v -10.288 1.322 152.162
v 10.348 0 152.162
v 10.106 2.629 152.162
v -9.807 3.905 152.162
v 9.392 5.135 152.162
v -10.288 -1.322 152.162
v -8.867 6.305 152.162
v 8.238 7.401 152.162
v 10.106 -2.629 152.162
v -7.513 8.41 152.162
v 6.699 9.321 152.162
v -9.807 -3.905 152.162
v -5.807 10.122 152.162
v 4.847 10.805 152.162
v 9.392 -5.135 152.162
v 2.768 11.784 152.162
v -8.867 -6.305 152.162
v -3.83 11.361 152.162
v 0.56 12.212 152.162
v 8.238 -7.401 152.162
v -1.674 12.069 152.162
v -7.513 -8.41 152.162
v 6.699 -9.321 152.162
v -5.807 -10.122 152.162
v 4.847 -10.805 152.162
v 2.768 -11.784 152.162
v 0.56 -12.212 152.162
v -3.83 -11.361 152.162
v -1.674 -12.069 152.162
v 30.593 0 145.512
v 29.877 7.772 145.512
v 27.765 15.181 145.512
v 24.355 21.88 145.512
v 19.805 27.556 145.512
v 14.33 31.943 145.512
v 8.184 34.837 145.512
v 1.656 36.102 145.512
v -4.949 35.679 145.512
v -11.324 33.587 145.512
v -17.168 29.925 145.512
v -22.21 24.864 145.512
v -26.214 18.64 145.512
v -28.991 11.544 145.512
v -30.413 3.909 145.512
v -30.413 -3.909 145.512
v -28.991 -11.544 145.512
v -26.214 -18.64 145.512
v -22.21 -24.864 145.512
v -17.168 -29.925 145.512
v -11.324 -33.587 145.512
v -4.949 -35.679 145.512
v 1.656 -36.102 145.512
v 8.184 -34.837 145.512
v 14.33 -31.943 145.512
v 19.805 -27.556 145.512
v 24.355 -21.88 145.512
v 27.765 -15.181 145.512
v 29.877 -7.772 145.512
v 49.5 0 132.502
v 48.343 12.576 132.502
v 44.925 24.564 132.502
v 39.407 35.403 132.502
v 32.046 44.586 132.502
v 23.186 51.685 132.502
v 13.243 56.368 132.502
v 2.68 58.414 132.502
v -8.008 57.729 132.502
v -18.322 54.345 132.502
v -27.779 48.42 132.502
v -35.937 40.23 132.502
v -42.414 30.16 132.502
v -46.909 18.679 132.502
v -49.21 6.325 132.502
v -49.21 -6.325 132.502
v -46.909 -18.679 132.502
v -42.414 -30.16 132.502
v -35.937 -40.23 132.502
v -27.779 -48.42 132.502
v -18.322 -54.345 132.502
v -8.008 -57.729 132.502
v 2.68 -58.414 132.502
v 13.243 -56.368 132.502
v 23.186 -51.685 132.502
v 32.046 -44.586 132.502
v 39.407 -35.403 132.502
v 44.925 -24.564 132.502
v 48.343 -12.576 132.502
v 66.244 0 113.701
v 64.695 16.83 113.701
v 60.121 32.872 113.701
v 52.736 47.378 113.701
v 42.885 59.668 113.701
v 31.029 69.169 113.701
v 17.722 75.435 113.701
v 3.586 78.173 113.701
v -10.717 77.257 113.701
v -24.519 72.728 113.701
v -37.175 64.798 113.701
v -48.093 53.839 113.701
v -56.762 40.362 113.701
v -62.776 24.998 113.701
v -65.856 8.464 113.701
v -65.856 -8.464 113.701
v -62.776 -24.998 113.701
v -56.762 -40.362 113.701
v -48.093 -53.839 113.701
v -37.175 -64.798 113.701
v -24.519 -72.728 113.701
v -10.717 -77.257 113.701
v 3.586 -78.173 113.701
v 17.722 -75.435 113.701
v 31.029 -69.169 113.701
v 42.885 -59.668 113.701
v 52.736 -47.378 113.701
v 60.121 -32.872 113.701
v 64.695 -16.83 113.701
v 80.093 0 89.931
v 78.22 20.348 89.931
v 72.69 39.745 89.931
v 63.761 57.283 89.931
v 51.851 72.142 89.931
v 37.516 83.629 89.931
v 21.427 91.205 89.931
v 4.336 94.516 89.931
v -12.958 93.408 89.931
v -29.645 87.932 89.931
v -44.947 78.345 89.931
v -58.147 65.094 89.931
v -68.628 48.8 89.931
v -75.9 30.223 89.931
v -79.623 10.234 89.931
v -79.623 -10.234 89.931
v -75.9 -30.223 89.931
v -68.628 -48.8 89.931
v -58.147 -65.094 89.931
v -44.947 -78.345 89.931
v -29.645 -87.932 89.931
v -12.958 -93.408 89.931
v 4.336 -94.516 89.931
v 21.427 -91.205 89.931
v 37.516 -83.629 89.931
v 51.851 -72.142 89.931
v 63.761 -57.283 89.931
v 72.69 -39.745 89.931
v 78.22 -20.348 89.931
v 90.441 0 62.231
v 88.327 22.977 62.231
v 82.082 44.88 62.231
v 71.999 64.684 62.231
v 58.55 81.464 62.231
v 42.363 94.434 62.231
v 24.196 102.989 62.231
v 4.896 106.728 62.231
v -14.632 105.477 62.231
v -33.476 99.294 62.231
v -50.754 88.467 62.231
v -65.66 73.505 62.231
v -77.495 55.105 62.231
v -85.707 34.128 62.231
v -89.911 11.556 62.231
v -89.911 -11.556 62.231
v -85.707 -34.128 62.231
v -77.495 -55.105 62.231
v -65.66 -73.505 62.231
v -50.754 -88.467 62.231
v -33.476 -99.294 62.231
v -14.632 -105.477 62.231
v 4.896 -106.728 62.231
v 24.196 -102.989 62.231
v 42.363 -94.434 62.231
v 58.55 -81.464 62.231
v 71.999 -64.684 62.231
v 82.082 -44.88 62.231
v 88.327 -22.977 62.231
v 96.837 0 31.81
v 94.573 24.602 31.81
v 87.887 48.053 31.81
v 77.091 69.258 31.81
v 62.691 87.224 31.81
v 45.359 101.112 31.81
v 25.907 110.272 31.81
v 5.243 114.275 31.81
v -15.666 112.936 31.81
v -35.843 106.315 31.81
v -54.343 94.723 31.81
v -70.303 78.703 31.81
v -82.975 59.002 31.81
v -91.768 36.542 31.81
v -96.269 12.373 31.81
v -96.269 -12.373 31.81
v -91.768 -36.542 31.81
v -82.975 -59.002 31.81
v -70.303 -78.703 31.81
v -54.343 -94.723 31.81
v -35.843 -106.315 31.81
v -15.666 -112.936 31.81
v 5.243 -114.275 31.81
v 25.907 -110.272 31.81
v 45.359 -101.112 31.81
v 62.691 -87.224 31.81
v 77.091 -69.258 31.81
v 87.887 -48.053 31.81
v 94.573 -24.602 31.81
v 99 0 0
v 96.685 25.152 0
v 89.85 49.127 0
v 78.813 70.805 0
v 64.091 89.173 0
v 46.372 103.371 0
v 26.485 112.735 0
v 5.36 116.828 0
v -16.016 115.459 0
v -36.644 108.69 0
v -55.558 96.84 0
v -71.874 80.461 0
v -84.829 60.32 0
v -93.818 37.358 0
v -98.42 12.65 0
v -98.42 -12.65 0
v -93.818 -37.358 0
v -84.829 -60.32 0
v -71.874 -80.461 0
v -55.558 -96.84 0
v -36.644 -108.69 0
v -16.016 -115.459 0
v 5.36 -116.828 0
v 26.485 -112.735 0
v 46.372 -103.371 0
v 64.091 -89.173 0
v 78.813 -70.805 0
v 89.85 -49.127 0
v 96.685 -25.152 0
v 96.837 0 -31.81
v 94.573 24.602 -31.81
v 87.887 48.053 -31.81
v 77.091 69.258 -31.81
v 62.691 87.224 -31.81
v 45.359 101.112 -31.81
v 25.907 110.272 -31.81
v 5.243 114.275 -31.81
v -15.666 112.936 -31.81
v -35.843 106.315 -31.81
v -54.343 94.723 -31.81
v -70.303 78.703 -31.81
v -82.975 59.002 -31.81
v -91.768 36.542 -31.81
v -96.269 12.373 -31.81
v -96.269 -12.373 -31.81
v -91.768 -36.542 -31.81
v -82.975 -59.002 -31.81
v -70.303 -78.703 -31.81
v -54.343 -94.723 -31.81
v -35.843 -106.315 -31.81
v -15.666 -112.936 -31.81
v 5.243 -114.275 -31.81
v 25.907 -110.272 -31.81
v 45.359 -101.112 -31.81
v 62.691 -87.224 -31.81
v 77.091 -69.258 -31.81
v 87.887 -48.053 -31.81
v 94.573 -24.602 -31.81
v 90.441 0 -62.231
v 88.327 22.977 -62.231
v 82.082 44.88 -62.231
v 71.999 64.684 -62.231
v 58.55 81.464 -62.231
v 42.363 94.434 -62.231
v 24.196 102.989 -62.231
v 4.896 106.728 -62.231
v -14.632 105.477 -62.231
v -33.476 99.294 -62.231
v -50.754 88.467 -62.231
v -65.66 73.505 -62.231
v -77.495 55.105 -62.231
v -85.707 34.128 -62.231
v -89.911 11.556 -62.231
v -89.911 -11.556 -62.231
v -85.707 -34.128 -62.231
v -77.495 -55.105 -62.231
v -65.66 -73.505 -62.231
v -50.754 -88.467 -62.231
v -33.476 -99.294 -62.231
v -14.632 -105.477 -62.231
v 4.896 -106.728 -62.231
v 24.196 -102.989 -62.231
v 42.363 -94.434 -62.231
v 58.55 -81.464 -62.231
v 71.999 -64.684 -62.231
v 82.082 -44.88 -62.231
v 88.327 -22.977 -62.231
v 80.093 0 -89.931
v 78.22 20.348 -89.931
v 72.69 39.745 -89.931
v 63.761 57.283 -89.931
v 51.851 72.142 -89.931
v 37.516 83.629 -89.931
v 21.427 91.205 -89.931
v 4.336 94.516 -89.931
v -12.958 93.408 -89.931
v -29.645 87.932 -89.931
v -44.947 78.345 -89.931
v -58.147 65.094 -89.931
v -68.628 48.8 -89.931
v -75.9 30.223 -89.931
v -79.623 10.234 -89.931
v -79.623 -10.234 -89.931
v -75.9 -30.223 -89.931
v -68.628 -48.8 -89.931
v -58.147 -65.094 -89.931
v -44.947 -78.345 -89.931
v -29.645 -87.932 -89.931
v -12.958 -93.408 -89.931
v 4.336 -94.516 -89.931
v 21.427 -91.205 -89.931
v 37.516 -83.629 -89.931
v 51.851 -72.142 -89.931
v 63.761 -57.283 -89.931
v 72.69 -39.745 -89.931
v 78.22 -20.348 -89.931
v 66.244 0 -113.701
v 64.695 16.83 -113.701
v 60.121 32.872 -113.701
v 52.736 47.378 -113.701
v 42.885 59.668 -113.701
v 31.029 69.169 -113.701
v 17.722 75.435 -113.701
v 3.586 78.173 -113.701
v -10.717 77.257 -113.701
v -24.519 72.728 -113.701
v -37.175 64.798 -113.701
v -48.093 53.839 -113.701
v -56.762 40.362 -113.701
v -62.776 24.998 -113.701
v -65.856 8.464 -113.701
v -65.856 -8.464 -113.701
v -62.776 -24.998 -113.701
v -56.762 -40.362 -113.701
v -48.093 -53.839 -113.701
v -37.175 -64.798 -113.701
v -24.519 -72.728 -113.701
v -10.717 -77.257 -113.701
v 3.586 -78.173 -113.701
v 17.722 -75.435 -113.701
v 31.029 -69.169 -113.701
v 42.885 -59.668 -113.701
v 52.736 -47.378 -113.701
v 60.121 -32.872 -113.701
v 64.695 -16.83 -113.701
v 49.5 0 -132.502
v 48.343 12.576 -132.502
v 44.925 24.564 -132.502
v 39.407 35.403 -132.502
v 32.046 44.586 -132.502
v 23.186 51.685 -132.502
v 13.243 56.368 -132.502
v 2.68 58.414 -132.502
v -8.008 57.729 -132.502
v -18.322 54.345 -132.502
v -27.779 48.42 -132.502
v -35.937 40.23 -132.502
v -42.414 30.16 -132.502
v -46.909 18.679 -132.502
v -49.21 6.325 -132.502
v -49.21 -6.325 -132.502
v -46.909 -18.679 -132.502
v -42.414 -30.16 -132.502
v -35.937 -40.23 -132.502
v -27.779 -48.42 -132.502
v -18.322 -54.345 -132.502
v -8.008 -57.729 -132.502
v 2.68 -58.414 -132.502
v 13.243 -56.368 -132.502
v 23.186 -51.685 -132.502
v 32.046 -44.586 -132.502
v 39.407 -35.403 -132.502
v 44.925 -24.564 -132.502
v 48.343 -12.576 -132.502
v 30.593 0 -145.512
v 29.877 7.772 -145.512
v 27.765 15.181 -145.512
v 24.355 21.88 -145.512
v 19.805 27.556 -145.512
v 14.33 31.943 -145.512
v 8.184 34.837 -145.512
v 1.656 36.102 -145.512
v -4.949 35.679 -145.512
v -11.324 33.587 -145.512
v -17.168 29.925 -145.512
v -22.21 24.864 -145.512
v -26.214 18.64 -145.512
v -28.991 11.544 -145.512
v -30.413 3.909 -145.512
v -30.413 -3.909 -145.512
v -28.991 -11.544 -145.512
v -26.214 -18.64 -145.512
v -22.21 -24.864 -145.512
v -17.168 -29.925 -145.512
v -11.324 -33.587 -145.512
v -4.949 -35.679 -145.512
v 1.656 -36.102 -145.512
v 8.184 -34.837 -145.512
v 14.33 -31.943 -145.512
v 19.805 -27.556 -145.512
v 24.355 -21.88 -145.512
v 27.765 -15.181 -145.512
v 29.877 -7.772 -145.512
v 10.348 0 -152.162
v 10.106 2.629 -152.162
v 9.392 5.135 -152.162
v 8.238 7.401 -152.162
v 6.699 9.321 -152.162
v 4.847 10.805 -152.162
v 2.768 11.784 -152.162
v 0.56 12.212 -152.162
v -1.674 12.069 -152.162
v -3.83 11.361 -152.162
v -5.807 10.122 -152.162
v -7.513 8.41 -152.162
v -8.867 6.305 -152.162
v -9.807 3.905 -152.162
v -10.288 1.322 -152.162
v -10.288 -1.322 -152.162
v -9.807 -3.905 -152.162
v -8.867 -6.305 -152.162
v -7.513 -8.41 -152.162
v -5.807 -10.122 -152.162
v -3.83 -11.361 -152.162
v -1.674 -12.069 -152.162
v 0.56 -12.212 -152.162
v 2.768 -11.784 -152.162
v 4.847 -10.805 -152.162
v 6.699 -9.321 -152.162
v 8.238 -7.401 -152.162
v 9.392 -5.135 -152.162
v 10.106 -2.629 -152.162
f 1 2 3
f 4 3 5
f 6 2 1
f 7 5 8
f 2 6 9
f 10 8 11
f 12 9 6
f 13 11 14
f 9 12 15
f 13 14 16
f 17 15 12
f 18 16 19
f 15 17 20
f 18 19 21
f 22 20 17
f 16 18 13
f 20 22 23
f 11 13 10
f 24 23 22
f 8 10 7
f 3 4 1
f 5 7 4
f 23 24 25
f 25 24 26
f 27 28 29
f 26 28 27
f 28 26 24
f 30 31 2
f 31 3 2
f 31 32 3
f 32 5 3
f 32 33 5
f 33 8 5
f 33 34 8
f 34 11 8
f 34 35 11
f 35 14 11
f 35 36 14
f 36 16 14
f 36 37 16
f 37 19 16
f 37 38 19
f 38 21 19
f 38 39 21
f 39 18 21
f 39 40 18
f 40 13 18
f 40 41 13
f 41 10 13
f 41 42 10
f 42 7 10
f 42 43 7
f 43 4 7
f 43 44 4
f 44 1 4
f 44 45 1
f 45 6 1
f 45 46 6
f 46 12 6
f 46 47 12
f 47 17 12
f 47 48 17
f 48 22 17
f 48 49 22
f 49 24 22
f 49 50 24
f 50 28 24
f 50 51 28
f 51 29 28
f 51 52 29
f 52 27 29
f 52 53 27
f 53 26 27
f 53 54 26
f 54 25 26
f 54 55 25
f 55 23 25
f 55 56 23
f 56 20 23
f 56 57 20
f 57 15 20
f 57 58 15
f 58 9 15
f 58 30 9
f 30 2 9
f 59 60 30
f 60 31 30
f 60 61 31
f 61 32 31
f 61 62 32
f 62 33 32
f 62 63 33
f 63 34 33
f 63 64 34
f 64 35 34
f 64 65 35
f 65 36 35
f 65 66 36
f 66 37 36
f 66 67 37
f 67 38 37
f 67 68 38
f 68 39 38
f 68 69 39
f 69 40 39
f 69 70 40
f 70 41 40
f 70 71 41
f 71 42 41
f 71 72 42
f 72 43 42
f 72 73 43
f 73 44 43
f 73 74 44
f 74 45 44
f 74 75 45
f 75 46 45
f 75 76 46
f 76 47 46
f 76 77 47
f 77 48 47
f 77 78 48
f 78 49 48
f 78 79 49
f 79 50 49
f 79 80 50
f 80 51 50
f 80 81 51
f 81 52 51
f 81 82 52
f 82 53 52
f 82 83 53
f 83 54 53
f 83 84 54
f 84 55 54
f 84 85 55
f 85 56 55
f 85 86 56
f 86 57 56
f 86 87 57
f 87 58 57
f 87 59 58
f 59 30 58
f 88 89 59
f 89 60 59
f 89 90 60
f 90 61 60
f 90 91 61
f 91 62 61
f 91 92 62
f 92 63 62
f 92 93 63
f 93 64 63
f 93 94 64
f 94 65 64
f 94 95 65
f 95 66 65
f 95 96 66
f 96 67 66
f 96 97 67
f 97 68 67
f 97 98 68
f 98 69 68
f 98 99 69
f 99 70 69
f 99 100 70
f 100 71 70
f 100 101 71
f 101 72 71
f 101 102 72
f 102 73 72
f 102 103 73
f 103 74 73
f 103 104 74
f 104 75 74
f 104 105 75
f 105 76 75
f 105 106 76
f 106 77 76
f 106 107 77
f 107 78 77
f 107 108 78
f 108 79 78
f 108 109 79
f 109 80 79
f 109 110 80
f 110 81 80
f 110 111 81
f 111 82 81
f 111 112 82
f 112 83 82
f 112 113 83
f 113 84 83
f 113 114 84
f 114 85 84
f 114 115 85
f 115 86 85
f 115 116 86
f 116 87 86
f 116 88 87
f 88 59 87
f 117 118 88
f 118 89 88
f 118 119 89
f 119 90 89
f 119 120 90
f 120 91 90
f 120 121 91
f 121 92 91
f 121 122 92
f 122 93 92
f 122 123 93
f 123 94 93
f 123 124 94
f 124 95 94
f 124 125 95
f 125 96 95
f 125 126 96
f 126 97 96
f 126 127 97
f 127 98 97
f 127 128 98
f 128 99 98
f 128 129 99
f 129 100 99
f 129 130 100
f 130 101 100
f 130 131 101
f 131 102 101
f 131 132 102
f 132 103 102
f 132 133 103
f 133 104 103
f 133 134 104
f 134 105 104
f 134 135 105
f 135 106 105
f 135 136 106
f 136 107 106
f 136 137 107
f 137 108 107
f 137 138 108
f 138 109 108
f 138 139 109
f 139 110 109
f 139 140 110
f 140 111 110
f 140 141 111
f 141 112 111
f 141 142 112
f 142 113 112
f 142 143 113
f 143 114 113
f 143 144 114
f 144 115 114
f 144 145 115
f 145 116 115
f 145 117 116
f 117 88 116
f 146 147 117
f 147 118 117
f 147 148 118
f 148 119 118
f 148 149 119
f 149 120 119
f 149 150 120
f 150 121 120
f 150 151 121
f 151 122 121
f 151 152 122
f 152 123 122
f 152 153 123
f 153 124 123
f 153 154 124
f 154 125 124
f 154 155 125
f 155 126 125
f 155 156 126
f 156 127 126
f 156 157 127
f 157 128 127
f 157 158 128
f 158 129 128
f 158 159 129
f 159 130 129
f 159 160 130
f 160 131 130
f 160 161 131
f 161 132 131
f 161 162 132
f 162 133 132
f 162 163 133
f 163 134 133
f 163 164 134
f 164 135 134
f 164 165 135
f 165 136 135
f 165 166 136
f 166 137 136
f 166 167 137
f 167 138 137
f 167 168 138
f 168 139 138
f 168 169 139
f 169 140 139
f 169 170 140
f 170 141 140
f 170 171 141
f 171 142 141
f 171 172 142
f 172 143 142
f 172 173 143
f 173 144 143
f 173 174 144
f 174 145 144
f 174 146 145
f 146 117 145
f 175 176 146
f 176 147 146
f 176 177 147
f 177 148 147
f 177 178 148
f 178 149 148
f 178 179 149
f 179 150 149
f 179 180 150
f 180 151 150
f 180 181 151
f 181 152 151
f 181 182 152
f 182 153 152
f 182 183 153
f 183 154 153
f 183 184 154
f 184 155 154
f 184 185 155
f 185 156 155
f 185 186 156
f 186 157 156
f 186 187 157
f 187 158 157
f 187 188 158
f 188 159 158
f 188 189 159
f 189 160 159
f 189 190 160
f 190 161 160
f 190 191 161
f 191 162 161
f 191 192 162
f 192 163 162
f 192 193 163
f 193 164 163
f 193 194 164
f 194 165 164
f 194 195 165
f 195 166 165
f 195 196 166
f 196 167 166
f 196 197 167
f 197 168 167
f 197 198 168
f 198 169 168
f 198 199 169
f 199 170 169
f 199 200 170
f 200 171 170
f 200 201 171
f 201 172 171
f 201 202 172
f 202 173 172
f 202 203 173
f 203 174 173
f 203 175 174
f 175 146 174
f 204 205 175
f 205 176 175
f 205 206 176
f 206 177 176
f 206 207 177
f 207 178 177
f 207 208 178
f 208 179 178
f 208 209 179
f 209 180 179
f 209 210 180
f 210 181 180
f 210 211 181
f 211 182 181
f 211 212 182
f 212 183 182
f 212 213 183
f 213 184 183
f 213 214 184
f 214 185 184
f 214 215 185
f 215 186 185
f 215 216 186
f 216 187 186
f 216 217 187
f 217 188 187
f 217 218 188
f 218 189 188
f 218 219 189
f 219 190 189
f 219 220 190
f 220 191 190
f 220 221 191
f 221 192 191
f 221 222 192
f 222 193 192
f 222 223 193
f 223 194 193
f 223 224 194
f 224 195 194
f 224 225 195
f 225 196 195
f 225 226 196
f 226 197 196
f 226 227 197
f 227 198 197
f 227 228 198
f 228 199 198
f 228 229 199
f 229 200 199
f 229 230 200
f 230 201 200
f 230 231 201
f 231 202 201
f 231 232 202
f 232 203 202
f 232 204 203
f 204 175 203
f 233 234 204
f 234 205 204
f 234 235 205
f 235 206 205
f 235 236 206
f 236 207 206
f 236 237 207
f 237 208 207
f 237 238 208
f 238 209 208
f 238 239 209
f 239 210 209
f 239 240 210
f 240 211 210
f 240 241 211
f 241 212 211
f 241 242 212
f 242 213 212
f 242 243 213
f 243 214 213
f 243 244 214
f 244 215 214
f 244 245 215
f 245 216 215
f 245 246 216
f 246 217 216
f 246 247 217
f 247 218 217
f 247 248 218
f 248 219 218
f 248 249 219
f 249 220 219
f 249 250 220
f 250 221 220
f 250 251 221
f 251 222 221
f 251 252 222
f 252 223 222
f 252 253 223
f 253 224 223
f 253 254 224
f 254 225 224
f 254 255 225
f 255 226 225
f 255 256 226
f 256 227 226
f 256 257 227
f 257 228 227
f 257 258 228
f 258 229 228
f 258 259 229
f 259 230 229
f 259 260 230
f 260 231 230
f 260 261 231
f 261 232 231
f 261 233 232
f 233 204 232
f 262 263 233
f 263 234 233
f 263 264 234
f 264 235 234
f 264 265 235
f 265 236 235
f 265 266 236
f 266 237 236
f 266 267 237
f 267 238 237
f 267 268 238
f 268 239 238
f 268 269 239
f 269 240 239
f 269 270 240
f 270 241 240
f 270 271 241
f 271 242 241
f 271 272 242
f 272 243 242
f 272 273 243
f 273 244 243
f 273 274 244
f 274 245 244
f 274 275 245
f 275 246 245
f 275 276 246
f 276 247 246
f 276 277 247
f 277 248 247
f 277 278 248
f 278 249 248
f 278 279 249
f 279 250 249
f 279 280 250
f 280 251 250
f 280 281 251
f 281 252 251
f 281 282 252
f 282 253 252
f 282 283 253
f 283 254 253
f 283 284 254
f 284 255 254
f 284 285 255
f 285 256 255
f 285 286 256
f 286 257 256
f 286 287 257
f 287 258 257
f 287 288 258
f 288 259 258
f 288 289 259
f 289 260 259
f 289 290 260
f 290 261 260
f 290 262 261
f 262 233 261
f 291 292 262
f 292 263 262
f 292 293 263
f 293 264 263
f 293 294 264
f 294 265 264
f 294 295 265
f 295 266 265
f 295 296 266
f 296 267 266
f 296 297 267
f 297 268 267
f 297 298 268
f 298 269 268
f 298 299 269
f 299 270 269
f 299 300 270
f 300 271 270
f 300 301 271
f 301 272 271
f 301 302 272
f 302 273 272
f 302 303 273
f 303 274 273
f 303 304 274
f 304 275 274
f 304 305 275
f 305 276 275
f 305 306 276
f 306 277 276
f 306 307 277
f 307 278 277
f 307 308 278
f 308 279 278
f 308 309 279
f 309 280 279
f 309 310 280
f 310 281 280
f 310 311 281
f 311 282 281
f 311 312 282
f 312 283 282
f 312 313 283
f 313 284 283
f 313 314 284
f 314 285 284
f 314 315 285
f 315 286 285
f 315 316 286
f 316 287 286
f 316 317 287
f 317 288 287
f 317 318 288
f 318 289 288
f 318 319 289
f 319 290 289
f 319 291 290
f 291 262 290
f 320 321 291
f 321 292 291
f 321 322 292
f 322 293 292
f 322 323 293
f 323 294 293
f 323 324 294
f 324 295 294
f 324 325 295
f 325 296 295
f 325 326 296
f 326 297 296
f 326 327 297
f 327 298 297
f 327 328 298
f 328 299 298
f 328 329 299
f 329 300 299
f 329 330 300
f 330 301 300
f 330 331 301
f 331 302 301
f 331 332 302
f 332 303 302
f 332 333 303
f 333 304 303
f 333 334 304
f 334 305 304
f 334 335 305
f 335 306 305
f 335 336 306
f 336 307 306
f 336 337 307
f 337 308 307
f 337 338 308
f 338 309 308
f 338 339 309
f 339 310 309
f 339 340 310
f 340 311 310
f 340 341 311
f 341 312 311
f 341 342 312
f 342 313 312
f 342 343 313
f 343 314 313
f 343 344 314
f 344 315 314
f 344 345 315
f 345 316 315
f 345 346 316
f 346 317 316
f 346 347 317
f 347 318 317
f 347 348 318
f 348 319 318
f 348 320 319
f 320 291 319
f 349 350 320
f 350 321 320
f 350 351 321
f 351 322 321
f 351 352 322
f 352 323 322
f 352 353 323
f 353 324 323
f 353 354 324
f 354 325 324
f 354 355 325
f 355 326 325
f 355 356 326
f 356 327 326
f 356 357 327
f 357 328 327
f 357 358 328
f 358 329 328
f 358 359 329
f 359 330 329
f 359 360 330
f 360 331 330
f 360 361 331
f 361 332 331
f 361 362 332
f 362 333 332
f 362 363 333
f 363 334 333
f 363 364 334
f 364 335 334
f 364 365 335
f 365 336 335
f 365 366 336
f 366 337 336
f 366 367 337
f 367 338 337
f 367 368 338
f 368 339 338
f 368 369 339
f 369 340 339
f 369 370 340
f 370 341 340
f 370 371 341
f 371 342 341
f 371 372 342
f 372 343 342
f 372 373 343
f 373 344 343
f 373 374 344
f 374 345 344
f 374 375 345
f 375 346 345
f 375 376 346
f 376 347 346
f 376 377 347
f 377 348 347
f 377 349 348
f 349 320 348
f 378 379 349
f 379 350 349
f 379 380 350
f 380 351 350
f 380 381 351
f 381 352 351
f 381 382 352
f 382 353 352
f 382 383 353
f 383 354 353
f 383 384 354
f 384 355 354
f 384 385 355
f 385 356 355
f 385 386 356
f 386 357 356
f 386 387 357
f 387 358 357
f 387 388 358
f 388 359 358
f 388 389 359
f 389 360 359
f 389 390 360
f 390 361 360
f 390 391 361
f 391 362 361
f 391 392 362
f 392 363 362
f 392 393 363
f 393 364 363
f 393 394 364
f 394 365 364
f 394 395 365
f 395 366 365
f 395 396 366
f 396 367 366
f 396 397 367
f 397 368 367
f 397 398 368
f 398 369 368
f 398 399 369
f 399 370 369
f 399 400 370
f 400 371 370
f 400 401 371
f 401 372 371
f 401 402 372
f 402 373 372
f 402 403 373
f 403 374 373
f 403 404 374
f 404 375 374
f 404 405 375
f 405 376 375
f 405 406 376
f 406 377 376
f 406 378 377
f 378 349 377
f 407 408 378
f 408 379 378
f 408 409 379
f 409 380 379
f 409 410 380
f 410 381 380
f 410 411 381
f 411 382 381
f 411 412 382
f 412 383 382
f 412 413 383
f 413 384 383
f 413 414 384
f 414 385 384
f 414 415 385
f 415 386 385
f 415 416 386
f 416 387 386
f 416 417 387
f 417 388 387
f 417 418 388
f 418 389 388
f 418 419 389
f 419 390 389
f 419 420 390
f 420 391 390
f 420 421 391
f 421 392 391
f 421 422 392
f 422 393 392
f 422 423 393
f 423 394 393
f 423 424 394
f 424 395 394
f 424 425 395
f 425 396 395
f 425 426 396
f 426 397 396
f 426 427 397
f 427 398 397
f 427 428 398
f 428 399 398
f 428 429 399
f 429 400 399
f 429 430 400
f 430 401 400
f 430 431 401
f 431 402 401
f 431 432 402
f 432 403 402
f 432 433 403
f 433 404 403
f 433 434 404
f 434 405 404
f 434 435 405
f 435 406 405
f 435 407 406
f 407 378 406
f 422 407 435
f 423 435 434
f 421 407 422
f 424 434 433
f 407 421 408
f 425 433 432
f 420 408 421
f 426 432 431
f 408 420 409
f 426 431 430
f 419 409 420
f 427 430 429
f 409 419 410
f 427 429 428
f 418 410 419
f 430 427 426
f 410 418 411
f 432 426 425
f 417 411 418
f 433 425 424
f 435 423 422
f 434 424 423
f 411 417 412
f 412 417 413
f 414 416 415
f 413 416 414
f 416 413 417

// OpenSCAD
// Generated by SolidPython 1.0.1 on 2020-07-29 00:46:49


scale(v = [11, 13, 17]) {
	sphere(r = 9);
}
/***********************************************
*********      SolidPython code:      **********
************************************************
 
# import packages: SolidPython
from solid import *
from solid.utils import *
from itertools import chain, combinations, permutations


class Resize:

    def __init__(self, scad_file):
        self.scad_file = scad_file
        #self.scad_file = import_scad(scad_file)
        # cone/cylinder param:
        self.r1 = 0
        self.r2 = 0
        self.h = 0
        # rectangular prism param:
        self.w = 0
        self.l = 0
        # ellipse param:
        self.r = 0

    # import OpenScad code (file name corresponds to shape)


    # classify shape + parameters
    def assign(self, param1, param2, param3):
        if self.scad_file == 'cone.scad':
            self.r1 = param1
            self.r2 = param2
            self.h = param3
        elif self.scad_file == 'cylinder.scad':
            self.r1 = param1
            self.r2 = param2
            self.h = param3
        elif self.scad_file == 'rectangularPrism.scad':
            self.h = param1
            self.l = param2
            self.w = param3
        else:
            self.r = param1
            self.h = param2

    # resize parameters
    def iterate(self):
        x = range(3, 20, 2)
        i = 1
        if self.scad_file == 'cone.scad':
            tempList = list(permutations(x, 2))
            for temp in tempList:
                param1 = temp[0]
                param2 = temp[1]
                filepath = 'produced_scad_files/' + 'cone' + str(param1) + '_' + str(param2) + '_' + '.scad'
                scad_render_to_file(cylinder(h=param1, r1=param2, r2=0), filepath)

        elif self.scad_file == 'cylinder.scad':
            tempList = list(permutations(x, 3))
            for temp in tempList:
                param1 = temp[0]
                param2 = temp[1]
                filepath = 'produced_scad_files/' + 'cylinder' + str(param1) + '_' + str(param2) + '_' + '.scad'
                scad_render_to_file(cylinder(h=param1, r1=param2, r2=param2), filepath)

        elif self.scad_file == 'rectangularPrism.scad':
            tempList = list(permutations(x, 3))
            for temp in tempList:
                param1 = temp[0]
                param2 = temp[1]
                param3 = temp[2]
                filepath = 'produced_scad_files/' + 'rectangularPrism' + str(param1) + '_' + str(param2) + '_' + str(
                    param3) + '.scad'
                scad_render_to_file(cube(size=(param1, param2, param3)), filepath)

        elif self.scad_file == 'ellipse.scad':
            tempList = list(permutations(x, 4))
            for temp in tempList:
                param1 = temp[0]
                param2 = temp[1]
                param3 = temp[2]
                param4 = temp[3]
                filepath = 'produced_scad_files/' + 'ellipse' + str(param1) + '_' + str(param2) + '_' + str(param3) + '_' + str(param4) + '.scad'
                scad_render_to_file(scale([param1, param2, param3])(sphere(r=param4)), filepath)

    def render_to_scadfile(self):
        scad_render_to_file(scad, 'example.scad') 
 
************************************************/
